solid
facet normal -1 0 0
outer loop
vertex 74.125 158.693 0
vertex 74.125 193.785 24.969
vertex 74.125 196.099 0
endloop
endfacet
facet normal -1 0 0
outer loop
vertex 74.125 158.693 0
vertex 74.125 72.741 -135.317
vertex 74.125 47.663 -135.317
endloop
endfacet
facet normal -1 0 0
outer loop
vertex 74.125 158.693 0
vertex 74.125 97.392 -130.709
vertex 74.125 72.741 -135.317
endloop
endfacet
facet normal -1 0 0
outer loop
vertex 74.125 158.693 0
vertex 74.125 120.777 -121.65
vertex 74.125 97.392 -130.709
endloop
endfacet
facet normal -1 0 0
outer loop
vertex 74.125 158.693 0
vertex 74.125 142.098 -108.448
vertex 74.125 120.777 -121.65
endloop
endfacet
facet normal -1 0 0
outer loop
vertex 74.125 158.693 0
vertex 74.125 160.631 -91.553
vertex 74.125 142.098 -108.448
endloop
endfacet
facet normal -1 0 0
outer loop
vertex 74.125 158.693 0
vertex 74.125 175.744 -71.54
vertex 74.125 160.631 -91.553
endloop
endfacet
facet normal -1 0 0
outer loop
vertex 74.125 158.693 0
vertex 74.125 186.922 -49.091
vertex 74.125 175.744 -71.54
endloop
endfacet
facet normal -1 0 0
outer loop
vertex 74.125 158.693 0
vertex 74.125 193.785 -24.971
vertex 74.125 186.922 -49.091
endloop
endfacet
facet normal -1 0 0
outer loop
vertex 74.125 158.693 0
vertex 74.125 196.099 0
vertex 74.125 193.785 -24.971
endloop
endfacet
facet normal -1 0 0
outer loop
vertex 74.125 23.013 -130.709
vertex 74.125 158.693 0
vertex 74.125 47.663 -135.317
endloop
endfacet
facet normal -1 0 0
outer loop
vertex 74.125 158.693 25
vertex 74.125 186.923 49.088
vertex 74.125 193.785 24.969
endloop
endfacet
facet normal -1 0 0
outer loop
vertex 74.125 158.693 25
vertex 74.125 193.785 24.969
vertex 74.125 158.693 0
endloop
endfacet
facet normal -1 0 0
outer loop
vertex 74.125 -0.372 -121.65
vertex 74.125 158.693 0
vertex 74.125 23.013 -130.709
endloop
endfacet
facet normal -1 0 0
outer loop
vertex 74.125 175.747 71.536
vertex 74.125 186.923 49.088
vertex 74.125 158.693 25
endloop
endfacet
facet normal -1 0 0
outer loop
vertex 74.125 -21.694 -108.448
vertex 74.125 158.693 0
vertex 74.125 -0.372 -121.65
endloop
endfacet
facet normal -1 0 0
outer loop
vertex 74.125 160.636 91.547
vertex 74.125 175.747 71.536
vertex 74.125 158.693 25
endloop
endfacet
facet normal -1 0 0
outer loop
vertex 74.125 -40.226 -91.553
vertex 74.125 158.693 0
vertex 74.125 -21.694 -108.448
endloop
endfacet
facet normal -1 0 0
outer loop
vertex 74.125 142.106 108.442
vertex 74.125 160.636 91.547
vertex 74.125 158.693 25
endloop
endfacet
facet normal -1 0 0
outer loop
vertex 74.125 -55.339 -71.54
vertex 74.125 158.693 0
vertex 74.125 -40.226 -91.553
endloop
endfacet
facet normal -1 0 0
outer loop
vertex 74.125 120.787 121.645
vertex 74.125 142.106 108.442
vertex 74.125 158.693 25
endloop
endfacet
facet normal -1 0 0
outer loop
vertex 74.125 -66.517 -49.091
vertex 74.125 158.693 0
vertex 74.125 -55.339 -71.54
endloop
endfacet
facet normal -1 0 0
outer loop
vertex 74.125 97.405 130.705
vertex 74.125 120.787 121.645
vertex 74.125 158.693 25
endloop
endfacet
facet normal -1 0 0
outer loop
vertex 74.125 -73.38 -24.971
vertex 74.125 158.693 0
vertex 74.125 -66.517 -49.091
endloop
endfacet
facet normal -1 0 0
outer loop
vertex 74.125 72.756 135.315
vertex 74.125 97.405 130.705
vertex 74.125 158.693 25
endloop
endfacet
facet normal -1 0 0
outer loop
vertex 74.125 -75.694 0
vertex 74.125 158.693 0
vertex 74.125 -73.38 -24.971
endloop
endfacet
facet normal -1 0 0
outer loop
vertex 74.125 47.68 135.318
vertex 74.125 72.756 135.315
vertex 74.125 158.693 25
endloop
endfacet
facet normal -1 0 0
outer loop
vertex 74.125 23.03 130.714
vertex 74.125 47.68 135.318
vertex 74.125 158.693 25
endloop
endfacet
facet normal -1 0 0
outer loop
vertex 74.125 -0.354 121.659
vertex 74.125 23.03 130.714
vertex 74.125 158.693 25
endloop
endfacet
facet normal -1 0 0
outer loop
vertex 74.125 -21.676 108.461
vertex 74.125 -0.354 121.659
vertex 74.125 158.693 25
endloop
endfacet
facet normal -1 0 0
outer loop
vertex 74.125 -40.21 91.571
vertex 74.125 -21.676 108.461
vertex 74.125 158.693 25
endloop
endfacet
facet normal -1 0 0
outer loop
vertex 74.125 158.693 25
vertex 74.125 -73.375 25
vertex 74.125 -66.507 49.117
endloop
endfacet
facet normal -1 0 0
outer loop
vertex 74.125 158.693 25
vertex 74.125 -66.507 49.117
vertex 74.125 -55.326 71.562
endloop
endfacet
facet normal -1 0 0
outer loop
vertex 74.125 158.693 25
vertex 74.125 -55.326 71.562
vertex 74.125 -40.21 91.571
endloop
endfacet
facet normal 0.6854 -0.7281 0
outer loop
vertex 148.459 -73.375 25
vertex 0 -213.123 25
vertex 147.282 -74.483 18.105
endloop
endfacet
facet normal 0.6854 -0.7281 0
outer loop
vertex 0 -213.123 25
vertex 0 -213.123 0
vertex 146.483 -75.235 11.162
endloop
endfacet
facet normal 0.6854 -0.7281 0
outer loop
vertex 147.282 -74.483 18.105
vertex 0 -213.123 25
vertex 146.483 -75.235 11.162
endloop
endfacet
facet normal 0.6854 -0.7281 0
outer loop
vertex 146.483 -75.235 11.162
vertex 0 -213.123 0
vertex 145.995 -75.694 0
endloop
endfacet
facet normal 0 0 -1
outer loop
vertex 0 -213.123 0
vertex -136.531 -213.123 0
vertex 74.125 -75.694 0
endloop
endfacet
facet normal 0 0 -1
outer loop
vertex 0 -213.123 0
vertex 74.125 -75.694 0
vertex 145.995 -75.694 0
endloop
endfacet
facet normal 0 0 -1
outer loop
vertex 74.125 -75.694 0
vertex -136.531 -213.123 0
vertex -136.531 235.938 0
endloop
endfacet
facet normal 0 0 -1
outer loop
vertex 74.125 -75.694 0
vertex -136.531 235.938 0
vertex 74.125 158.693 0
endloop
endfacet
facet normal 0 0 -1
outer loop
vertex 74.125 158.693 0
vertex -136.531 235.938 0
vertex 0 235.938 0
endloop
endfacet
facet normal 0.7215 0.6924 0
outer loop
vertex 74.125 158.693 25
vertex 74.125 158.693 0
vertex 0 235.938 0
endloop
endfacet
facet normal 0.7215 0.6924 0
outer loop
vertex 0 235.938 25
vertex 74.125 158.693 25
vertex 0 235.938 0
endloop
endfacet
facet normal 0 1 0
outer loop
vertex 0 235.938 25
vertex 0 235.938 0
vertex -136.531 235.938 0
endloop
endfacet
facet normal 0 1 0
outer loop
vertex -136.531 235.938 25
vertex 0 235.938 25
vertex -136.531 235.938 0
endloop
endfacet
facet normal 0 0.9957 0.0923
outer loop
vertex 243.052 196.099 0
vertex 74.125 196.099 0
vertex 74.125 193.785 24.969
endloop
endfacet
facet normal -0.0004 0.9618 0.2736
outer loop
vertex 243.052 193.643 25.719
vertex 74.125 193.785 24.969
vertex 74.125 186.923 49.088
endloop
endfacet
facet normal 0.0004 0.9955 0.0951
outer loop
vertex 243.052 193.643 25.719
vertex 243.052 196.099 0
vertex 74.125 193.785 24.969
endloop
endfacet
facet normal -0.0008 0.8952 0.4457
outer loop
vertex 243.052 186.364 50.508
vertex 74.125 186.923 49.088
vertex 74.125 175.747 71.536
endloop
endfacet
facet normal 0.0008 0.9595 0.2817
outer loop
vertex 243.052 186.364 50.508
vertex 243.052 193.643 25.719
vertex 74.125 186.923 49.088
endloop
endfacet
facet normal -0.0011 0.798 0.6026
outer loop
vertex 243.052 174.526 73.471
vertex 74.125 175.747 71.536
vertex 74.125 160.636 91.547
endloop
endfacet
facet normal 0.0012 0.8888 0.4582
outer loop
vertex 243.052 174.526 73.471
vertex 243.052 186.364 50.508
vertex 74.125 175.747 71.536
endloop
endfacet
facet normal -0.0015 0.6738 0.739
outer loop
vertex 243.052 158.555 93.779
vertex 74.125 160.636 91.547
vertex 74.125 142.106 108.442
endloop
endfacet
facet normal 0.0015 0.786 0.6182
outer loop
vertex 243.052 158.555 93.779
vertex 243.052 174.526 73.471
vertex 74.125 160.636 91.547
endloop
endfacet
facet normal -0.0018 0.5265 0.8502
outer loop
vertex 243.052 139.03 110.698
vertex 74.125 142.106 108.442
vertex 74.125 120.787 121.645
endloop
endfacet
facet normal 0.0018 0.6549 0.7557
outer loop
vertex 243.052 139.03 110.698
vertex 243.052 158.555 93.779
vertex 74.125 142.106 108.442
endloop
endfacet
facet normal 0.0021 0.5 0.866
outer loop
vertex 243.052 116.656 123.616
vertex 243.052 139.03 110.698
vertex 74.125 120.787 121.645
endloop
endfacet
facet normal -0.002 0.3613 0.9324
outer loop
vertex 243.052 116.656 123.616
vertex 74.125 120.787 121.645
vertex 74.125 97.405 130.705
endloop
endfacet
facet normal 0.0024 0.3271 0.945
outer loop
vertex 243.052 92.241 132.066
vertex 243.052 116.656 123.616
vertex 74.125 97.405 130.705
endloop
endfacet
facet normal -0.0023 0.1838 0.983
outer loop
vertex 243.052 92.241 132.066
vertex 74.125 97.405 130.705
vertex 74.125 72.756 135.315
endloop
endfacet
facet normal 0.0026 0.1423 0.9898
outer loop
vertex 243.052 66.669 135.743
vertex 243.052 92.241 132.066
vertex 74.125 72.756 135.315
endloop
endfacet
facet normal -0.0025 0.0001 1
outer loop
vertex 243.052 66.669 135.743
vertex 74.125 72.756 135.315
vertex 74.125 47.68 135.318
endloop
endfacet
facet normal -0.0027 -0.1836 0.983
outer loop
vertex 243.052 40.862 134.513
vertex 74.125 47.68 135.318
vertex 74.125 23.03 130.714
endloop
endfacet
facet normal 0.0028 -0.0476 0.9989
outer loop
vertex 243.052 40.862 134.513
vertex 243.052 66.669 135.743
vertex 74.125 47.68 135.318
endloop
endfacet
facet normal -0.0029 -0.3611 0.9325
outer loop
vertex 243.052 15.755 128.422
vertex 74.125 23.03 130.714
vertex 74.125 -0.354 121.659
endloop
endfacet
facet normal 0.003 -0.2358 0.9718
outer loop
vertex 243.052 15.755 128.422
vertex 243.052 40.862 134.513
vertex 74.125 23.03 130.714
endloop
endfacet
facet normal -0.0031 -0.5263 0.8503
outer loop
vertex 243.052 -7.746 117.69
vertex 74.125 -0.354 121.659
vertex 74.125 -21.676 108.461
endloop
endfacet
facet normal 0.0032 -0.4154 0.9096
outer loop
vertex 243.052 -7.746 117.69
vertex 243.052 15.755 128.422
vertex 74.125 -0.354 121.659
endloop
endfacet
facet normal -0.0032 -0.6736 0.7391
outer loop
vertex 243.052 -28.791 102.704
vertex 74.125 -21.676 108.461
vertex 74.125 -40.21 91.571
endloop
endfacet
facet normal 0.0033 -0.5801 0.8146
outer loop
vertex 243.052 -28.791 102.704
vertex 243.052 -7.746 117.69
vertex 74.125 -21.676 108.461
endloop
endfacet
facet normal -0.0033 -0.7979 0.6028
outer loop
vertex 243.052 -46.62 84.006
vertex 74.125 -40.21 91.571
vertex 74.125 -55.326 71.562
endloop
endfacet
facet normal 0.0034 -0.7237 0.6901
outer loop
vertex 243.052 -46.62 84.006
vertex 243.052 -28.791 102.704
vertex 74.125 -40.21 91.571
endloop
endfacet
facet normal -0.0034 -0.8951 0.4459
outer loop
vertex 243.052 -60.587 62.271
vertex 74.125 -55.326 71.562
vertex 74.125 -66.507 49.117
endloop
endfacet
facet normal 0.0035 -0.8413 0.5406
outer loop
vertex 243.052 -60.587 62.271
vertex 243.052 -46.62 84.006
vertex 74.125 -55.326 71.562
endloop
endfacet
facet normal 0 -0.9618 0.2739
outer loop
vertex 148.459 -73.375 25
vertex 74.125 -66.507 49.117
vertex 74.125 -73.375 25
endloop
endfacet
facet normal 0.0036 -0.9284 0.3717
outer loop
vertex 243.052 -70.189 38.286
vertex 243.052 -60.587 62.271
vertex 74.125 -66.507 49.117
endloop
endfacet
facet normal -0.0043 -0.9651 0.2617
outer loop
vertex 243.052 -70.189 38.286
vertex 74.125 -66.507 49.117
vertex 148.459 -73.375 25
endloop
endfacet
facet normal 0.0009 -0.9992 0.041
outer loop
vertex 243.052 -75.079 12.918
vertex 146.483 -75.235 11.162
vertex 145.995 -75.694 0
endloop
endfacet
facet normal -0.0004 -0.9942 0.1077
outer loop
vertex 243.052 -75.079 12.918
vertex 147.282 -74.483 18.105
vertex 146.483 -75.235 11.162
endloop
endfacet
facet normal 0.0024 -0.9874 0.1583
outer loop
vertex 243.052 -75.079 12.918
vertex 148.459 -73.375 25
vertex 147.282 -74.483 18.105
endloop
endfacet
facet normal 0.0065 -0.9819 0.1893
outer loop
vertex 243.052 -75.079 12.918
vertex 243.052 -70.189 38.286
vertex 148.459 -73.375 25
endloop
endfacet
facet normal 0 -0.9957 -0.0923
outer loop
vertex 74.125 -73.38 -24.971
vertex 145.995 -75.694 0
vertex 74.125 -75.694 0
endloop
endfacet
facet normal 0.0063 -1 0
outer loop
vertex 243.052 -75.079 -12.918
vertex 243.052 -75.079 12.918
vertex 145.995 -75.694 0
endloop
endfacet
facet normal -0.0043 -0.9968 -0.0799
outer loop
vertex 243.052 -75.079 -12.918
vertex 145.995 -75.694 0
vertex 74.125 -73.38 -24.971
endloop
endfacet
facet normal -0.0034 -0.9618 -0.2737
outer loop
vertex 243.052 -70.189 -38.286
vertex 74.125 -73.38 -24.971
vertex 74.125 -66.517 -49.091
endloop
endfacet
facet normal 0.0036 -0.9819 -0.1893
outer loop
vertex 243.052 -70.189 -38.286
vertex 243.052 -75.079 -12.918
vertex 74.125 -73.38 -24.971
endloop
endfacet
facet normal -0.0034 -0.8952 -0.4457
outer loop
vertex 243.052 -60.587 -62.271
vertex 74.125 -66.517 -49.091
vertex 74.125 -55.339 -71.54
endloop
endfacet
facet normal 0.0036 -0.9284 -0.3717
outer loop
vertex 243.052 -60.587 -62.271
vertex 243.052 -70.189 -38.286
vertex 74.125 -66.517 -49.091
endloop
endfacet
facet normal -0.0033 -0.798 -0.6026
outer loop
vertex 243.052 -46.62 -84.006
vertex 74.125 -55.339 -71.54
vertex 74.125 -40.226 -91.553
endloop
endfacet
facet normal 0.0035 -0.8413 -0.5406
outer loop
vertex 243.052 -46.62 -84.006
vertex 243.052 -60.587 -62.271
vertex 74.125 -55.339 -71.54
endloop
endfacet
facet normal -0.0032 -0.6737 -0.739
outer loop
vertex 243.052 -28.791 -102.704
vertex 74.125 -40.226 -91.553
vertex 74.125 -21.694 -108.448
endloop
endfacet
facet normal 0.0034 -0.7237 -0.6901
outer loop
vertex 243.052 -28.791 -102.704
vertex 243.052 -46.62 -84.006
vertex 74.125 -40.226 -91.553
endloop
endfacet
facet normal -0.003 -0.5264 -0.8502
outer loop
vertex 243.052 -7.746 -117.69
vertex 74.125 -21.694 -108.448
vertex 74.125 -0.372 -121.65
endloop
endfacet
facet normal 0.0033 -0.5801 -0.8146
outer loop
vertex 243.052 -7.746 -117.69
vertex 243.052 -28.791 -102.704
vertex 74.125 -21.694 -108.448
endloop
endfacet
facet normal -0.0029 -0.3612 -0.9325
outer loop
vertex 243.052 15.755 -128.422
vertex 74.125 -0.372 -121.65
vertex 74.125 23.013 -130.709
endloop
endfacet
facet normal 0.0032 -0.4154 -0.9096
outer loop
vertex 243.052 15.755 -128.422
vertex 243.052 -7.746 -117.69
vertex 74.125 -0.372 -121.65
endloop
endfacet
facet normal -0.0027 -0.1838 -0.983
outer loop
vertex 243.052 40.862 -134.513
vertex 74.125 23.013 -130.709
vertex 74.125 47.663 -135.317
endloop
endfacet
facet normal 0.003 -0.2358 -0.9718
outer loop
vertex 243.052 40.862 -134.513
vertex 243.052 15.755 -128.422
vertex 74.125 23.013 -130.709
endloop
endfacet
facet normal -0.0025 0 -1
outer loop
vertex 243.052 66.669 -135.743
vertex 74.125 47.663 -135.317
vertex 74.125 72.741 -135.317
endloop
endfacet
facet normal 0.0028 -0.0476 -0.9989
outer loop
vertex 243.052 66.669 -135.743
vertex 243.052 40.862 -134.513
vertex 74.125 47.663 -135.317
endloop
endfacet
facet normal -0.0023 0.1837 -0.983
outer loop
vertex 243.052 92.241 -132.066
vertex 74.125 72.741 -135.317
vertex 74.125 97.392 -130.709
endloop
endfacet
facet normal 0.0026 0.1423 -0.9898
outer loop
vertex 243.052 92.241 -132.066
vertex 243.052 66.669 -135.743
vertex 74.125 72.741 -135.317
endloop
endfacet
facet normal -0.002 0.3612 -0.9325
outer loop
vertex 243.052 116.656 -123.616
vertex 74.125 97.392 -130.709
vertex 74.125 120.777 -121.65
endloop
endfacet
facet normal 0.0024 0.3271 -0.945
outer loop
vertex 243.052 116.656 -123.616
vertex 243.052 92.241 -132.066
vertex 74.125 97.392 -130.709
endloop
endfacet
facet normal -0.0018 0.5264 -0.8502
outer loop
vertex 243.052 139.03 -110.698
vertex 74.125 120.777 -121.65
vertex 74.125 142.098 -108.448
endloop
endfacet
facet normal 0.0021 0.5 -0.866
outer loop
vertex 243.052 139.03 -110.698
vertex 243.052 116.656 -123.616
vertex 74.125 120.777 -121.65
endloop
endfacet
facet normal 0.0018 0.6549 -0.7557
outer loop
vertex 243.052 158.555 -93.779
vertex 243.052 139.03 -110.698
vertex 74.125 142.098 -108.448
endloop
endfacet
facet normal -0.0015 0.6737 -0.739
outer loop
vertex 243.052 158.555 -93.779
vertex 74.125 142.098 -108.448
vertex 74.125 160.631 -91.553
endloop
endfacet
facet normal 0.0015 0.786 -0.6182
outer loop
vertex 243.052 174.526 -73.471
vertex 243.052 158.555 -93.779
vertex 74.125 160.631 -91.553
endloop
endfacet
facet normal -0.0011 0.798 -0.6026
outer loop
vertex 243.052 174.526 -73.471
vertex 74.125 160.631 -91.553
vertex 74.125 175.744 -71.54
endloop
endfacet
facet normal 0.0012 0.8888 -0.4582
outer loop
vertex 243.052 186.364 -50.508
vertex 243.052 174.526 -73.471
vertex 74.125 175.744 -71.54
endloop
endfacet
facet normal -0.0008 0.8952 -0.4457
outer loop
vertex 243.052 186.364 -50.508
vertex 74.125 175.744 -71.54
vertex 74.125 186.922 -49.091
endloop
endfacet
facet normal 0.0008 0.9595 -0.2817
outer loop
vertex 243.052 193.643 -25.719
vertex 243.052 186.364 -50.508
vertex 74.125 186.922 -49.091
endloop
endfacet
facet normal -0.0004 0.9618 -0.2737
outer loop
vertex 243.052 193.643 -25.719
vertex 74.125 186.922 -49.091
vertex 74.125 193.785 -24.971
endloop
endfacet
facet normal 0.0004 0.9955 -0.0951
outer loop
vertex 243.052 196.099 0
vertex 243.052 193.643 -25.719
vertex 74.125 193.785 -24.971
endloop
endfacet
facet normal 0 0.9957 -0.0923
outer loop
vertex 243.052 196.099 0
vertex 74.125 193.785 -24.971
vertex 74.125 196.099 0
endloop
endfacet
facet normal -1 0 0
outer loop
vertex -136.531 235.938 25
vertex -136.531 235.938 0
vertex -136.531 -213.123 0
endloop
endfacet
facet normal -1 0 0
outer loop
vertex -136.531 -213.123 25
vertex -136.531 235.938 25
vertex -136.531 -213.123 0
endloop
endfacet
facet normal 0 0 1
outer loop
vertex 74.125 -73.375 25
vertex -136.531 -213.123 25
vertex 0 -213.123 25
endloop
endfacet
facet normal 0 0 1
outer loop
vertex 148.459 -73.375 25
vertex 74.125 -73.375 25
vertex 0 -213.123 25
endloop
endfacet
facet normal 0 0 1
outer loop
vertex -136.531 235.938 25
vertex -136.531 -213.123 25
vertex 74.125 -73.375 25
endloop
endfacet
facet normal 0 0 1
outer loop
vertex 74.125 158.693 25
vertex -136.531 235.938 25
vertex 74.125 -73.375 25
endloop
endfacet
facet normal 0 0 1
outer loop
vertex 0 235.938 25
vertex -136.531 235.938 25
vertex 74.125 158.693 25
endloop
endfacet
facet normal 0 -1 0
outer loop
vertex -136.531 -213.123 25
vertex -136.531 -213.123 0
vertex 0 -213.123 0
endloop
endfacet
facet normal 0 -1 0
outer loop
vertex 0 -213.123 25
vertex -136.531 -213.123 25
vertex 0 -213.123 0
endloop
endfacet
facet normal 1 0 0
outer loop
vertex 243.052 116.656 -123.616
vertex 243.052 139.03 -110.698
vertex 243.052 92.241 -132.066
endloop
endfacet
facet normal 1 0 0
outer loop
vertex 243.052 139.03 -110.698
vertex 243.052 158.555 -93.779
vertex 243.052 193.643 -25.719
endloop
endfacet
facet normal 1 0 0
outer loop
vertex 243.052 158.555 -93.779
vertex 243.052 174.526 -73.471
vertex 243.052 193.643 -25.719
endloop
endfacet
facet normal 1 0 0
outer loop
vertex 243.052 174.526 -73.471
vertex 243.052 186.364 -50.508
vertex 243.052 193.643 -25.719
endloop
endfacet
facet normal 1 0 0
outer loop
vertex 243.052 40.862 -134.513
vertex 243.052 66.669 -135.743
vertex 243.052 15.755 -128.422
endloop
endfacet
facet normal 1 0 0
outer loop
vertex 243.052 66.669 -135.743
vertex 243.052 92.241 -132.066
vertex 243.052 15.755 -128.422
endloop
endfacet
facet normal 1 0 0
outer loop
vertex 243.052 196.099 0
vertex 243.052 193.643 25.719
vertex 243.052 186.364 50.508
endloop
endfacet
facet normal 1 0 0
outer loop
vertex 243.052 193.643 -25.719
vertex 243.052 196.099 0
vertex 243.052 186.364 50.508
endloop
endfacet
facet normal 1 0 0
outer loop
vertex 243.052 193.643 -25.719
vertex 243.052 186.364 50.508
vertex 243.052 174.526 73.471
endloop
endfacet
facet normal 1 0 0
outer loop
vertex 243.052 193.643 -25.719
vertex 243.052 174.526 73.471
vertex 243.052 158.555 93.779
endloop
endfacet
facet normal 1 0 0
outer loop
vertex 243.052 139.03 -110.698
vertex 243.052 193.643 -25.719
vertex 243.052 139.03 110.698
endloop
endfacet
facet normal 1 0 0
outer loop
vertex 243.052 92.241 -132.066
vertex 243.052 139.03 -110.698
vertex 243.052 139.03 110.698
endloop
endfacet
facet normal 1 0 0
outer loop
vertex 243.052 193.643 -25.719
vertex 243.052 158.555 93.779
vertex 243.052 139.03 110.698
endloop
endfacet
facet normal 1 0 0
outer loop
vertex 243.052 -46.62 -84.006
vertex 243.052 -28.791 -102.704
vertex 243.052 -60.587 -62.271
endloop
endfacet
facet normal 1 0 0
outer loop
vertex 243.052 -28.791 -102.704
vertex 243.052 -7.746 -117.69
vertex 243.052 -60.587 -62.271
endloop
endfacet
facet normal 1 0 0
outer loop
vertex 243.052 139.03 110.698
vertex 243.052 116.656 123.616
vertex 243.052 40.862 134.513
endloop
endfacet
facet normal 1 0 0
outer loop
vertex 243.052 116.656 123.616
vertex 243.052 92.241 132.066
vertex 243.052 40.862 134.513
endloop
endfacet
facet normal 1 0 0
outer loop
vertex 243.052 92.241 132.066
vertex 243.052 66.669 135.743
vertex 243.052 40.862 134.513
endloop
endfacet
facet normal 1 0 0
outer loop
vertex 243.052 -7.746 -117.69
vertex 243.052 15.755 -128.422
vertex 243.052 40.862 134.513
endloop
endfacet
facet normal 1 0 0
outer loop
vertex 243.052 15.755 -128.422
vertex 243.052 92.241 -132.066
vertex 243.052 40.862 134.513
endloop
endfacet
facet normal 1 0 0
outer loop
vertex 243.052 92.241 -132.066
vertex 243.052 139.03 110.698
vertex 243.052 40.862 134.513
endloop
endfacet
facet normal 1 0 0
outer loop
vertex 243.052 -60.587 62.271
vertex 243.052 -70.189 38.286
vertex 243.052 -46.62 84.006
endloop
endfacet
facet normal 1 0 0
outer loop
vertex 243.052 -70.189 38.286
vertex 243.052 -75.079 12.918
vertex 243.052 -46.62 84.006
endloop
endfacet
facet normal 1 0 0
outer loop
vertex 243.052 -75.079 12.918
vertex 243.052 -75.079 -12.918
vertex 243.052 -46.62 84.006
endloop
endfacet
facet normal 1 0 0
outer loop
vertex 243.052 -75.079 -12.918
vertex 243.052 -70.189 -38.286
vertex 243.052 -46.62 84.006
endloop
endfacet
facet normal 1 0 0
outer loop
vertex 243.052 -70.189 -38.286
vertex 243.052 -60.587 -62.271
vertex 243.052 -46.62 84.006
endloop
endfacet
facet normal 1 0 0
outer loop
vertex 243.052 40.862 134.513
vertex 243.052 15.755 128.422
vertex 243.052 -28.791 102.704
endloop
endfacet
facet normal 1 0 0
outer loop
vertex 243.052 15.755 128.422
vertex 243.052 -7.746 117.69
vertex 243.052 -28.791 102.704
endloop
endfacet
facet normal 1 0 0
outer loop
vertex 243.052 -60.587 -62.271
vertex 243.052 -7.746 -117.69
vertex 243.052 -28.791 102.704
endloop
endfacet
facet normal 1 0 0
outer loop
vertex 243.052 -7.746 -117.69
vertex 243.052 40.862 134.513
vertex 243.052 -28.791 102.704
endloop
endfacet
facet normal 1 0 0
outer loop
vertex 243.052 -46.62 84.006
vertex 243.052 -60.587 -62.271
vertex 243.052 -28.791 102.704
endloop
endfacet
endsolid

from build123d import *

# Parameters (mm, degrees)
F0_W     = 168.927521
F0_H     = 135.896556
F3_DEPTH = 25


with BuildPart() as f2:
    # F0 (on Top) → F2 (revolve)
    with BuildSketch(Plane.XY):
        with Locations((158.588707, 128.150675)):
            Rectangle(F0_W, F0_H)
    revolve(axis=Axis((158.588707, 60.202397, 0), (1, 0, 0)))

    # F1 (on Top) → F3 (join)
    with BuildSketch(Plane.XY):
        Polygon((0, 235.938281), (-136.531189, 235.938281), (-136.531189, -213.123232), (0, -213.123232), (226.407066, 0), align=None)
    extrude(amount=F3_DEPTH)


solid = f2.part
